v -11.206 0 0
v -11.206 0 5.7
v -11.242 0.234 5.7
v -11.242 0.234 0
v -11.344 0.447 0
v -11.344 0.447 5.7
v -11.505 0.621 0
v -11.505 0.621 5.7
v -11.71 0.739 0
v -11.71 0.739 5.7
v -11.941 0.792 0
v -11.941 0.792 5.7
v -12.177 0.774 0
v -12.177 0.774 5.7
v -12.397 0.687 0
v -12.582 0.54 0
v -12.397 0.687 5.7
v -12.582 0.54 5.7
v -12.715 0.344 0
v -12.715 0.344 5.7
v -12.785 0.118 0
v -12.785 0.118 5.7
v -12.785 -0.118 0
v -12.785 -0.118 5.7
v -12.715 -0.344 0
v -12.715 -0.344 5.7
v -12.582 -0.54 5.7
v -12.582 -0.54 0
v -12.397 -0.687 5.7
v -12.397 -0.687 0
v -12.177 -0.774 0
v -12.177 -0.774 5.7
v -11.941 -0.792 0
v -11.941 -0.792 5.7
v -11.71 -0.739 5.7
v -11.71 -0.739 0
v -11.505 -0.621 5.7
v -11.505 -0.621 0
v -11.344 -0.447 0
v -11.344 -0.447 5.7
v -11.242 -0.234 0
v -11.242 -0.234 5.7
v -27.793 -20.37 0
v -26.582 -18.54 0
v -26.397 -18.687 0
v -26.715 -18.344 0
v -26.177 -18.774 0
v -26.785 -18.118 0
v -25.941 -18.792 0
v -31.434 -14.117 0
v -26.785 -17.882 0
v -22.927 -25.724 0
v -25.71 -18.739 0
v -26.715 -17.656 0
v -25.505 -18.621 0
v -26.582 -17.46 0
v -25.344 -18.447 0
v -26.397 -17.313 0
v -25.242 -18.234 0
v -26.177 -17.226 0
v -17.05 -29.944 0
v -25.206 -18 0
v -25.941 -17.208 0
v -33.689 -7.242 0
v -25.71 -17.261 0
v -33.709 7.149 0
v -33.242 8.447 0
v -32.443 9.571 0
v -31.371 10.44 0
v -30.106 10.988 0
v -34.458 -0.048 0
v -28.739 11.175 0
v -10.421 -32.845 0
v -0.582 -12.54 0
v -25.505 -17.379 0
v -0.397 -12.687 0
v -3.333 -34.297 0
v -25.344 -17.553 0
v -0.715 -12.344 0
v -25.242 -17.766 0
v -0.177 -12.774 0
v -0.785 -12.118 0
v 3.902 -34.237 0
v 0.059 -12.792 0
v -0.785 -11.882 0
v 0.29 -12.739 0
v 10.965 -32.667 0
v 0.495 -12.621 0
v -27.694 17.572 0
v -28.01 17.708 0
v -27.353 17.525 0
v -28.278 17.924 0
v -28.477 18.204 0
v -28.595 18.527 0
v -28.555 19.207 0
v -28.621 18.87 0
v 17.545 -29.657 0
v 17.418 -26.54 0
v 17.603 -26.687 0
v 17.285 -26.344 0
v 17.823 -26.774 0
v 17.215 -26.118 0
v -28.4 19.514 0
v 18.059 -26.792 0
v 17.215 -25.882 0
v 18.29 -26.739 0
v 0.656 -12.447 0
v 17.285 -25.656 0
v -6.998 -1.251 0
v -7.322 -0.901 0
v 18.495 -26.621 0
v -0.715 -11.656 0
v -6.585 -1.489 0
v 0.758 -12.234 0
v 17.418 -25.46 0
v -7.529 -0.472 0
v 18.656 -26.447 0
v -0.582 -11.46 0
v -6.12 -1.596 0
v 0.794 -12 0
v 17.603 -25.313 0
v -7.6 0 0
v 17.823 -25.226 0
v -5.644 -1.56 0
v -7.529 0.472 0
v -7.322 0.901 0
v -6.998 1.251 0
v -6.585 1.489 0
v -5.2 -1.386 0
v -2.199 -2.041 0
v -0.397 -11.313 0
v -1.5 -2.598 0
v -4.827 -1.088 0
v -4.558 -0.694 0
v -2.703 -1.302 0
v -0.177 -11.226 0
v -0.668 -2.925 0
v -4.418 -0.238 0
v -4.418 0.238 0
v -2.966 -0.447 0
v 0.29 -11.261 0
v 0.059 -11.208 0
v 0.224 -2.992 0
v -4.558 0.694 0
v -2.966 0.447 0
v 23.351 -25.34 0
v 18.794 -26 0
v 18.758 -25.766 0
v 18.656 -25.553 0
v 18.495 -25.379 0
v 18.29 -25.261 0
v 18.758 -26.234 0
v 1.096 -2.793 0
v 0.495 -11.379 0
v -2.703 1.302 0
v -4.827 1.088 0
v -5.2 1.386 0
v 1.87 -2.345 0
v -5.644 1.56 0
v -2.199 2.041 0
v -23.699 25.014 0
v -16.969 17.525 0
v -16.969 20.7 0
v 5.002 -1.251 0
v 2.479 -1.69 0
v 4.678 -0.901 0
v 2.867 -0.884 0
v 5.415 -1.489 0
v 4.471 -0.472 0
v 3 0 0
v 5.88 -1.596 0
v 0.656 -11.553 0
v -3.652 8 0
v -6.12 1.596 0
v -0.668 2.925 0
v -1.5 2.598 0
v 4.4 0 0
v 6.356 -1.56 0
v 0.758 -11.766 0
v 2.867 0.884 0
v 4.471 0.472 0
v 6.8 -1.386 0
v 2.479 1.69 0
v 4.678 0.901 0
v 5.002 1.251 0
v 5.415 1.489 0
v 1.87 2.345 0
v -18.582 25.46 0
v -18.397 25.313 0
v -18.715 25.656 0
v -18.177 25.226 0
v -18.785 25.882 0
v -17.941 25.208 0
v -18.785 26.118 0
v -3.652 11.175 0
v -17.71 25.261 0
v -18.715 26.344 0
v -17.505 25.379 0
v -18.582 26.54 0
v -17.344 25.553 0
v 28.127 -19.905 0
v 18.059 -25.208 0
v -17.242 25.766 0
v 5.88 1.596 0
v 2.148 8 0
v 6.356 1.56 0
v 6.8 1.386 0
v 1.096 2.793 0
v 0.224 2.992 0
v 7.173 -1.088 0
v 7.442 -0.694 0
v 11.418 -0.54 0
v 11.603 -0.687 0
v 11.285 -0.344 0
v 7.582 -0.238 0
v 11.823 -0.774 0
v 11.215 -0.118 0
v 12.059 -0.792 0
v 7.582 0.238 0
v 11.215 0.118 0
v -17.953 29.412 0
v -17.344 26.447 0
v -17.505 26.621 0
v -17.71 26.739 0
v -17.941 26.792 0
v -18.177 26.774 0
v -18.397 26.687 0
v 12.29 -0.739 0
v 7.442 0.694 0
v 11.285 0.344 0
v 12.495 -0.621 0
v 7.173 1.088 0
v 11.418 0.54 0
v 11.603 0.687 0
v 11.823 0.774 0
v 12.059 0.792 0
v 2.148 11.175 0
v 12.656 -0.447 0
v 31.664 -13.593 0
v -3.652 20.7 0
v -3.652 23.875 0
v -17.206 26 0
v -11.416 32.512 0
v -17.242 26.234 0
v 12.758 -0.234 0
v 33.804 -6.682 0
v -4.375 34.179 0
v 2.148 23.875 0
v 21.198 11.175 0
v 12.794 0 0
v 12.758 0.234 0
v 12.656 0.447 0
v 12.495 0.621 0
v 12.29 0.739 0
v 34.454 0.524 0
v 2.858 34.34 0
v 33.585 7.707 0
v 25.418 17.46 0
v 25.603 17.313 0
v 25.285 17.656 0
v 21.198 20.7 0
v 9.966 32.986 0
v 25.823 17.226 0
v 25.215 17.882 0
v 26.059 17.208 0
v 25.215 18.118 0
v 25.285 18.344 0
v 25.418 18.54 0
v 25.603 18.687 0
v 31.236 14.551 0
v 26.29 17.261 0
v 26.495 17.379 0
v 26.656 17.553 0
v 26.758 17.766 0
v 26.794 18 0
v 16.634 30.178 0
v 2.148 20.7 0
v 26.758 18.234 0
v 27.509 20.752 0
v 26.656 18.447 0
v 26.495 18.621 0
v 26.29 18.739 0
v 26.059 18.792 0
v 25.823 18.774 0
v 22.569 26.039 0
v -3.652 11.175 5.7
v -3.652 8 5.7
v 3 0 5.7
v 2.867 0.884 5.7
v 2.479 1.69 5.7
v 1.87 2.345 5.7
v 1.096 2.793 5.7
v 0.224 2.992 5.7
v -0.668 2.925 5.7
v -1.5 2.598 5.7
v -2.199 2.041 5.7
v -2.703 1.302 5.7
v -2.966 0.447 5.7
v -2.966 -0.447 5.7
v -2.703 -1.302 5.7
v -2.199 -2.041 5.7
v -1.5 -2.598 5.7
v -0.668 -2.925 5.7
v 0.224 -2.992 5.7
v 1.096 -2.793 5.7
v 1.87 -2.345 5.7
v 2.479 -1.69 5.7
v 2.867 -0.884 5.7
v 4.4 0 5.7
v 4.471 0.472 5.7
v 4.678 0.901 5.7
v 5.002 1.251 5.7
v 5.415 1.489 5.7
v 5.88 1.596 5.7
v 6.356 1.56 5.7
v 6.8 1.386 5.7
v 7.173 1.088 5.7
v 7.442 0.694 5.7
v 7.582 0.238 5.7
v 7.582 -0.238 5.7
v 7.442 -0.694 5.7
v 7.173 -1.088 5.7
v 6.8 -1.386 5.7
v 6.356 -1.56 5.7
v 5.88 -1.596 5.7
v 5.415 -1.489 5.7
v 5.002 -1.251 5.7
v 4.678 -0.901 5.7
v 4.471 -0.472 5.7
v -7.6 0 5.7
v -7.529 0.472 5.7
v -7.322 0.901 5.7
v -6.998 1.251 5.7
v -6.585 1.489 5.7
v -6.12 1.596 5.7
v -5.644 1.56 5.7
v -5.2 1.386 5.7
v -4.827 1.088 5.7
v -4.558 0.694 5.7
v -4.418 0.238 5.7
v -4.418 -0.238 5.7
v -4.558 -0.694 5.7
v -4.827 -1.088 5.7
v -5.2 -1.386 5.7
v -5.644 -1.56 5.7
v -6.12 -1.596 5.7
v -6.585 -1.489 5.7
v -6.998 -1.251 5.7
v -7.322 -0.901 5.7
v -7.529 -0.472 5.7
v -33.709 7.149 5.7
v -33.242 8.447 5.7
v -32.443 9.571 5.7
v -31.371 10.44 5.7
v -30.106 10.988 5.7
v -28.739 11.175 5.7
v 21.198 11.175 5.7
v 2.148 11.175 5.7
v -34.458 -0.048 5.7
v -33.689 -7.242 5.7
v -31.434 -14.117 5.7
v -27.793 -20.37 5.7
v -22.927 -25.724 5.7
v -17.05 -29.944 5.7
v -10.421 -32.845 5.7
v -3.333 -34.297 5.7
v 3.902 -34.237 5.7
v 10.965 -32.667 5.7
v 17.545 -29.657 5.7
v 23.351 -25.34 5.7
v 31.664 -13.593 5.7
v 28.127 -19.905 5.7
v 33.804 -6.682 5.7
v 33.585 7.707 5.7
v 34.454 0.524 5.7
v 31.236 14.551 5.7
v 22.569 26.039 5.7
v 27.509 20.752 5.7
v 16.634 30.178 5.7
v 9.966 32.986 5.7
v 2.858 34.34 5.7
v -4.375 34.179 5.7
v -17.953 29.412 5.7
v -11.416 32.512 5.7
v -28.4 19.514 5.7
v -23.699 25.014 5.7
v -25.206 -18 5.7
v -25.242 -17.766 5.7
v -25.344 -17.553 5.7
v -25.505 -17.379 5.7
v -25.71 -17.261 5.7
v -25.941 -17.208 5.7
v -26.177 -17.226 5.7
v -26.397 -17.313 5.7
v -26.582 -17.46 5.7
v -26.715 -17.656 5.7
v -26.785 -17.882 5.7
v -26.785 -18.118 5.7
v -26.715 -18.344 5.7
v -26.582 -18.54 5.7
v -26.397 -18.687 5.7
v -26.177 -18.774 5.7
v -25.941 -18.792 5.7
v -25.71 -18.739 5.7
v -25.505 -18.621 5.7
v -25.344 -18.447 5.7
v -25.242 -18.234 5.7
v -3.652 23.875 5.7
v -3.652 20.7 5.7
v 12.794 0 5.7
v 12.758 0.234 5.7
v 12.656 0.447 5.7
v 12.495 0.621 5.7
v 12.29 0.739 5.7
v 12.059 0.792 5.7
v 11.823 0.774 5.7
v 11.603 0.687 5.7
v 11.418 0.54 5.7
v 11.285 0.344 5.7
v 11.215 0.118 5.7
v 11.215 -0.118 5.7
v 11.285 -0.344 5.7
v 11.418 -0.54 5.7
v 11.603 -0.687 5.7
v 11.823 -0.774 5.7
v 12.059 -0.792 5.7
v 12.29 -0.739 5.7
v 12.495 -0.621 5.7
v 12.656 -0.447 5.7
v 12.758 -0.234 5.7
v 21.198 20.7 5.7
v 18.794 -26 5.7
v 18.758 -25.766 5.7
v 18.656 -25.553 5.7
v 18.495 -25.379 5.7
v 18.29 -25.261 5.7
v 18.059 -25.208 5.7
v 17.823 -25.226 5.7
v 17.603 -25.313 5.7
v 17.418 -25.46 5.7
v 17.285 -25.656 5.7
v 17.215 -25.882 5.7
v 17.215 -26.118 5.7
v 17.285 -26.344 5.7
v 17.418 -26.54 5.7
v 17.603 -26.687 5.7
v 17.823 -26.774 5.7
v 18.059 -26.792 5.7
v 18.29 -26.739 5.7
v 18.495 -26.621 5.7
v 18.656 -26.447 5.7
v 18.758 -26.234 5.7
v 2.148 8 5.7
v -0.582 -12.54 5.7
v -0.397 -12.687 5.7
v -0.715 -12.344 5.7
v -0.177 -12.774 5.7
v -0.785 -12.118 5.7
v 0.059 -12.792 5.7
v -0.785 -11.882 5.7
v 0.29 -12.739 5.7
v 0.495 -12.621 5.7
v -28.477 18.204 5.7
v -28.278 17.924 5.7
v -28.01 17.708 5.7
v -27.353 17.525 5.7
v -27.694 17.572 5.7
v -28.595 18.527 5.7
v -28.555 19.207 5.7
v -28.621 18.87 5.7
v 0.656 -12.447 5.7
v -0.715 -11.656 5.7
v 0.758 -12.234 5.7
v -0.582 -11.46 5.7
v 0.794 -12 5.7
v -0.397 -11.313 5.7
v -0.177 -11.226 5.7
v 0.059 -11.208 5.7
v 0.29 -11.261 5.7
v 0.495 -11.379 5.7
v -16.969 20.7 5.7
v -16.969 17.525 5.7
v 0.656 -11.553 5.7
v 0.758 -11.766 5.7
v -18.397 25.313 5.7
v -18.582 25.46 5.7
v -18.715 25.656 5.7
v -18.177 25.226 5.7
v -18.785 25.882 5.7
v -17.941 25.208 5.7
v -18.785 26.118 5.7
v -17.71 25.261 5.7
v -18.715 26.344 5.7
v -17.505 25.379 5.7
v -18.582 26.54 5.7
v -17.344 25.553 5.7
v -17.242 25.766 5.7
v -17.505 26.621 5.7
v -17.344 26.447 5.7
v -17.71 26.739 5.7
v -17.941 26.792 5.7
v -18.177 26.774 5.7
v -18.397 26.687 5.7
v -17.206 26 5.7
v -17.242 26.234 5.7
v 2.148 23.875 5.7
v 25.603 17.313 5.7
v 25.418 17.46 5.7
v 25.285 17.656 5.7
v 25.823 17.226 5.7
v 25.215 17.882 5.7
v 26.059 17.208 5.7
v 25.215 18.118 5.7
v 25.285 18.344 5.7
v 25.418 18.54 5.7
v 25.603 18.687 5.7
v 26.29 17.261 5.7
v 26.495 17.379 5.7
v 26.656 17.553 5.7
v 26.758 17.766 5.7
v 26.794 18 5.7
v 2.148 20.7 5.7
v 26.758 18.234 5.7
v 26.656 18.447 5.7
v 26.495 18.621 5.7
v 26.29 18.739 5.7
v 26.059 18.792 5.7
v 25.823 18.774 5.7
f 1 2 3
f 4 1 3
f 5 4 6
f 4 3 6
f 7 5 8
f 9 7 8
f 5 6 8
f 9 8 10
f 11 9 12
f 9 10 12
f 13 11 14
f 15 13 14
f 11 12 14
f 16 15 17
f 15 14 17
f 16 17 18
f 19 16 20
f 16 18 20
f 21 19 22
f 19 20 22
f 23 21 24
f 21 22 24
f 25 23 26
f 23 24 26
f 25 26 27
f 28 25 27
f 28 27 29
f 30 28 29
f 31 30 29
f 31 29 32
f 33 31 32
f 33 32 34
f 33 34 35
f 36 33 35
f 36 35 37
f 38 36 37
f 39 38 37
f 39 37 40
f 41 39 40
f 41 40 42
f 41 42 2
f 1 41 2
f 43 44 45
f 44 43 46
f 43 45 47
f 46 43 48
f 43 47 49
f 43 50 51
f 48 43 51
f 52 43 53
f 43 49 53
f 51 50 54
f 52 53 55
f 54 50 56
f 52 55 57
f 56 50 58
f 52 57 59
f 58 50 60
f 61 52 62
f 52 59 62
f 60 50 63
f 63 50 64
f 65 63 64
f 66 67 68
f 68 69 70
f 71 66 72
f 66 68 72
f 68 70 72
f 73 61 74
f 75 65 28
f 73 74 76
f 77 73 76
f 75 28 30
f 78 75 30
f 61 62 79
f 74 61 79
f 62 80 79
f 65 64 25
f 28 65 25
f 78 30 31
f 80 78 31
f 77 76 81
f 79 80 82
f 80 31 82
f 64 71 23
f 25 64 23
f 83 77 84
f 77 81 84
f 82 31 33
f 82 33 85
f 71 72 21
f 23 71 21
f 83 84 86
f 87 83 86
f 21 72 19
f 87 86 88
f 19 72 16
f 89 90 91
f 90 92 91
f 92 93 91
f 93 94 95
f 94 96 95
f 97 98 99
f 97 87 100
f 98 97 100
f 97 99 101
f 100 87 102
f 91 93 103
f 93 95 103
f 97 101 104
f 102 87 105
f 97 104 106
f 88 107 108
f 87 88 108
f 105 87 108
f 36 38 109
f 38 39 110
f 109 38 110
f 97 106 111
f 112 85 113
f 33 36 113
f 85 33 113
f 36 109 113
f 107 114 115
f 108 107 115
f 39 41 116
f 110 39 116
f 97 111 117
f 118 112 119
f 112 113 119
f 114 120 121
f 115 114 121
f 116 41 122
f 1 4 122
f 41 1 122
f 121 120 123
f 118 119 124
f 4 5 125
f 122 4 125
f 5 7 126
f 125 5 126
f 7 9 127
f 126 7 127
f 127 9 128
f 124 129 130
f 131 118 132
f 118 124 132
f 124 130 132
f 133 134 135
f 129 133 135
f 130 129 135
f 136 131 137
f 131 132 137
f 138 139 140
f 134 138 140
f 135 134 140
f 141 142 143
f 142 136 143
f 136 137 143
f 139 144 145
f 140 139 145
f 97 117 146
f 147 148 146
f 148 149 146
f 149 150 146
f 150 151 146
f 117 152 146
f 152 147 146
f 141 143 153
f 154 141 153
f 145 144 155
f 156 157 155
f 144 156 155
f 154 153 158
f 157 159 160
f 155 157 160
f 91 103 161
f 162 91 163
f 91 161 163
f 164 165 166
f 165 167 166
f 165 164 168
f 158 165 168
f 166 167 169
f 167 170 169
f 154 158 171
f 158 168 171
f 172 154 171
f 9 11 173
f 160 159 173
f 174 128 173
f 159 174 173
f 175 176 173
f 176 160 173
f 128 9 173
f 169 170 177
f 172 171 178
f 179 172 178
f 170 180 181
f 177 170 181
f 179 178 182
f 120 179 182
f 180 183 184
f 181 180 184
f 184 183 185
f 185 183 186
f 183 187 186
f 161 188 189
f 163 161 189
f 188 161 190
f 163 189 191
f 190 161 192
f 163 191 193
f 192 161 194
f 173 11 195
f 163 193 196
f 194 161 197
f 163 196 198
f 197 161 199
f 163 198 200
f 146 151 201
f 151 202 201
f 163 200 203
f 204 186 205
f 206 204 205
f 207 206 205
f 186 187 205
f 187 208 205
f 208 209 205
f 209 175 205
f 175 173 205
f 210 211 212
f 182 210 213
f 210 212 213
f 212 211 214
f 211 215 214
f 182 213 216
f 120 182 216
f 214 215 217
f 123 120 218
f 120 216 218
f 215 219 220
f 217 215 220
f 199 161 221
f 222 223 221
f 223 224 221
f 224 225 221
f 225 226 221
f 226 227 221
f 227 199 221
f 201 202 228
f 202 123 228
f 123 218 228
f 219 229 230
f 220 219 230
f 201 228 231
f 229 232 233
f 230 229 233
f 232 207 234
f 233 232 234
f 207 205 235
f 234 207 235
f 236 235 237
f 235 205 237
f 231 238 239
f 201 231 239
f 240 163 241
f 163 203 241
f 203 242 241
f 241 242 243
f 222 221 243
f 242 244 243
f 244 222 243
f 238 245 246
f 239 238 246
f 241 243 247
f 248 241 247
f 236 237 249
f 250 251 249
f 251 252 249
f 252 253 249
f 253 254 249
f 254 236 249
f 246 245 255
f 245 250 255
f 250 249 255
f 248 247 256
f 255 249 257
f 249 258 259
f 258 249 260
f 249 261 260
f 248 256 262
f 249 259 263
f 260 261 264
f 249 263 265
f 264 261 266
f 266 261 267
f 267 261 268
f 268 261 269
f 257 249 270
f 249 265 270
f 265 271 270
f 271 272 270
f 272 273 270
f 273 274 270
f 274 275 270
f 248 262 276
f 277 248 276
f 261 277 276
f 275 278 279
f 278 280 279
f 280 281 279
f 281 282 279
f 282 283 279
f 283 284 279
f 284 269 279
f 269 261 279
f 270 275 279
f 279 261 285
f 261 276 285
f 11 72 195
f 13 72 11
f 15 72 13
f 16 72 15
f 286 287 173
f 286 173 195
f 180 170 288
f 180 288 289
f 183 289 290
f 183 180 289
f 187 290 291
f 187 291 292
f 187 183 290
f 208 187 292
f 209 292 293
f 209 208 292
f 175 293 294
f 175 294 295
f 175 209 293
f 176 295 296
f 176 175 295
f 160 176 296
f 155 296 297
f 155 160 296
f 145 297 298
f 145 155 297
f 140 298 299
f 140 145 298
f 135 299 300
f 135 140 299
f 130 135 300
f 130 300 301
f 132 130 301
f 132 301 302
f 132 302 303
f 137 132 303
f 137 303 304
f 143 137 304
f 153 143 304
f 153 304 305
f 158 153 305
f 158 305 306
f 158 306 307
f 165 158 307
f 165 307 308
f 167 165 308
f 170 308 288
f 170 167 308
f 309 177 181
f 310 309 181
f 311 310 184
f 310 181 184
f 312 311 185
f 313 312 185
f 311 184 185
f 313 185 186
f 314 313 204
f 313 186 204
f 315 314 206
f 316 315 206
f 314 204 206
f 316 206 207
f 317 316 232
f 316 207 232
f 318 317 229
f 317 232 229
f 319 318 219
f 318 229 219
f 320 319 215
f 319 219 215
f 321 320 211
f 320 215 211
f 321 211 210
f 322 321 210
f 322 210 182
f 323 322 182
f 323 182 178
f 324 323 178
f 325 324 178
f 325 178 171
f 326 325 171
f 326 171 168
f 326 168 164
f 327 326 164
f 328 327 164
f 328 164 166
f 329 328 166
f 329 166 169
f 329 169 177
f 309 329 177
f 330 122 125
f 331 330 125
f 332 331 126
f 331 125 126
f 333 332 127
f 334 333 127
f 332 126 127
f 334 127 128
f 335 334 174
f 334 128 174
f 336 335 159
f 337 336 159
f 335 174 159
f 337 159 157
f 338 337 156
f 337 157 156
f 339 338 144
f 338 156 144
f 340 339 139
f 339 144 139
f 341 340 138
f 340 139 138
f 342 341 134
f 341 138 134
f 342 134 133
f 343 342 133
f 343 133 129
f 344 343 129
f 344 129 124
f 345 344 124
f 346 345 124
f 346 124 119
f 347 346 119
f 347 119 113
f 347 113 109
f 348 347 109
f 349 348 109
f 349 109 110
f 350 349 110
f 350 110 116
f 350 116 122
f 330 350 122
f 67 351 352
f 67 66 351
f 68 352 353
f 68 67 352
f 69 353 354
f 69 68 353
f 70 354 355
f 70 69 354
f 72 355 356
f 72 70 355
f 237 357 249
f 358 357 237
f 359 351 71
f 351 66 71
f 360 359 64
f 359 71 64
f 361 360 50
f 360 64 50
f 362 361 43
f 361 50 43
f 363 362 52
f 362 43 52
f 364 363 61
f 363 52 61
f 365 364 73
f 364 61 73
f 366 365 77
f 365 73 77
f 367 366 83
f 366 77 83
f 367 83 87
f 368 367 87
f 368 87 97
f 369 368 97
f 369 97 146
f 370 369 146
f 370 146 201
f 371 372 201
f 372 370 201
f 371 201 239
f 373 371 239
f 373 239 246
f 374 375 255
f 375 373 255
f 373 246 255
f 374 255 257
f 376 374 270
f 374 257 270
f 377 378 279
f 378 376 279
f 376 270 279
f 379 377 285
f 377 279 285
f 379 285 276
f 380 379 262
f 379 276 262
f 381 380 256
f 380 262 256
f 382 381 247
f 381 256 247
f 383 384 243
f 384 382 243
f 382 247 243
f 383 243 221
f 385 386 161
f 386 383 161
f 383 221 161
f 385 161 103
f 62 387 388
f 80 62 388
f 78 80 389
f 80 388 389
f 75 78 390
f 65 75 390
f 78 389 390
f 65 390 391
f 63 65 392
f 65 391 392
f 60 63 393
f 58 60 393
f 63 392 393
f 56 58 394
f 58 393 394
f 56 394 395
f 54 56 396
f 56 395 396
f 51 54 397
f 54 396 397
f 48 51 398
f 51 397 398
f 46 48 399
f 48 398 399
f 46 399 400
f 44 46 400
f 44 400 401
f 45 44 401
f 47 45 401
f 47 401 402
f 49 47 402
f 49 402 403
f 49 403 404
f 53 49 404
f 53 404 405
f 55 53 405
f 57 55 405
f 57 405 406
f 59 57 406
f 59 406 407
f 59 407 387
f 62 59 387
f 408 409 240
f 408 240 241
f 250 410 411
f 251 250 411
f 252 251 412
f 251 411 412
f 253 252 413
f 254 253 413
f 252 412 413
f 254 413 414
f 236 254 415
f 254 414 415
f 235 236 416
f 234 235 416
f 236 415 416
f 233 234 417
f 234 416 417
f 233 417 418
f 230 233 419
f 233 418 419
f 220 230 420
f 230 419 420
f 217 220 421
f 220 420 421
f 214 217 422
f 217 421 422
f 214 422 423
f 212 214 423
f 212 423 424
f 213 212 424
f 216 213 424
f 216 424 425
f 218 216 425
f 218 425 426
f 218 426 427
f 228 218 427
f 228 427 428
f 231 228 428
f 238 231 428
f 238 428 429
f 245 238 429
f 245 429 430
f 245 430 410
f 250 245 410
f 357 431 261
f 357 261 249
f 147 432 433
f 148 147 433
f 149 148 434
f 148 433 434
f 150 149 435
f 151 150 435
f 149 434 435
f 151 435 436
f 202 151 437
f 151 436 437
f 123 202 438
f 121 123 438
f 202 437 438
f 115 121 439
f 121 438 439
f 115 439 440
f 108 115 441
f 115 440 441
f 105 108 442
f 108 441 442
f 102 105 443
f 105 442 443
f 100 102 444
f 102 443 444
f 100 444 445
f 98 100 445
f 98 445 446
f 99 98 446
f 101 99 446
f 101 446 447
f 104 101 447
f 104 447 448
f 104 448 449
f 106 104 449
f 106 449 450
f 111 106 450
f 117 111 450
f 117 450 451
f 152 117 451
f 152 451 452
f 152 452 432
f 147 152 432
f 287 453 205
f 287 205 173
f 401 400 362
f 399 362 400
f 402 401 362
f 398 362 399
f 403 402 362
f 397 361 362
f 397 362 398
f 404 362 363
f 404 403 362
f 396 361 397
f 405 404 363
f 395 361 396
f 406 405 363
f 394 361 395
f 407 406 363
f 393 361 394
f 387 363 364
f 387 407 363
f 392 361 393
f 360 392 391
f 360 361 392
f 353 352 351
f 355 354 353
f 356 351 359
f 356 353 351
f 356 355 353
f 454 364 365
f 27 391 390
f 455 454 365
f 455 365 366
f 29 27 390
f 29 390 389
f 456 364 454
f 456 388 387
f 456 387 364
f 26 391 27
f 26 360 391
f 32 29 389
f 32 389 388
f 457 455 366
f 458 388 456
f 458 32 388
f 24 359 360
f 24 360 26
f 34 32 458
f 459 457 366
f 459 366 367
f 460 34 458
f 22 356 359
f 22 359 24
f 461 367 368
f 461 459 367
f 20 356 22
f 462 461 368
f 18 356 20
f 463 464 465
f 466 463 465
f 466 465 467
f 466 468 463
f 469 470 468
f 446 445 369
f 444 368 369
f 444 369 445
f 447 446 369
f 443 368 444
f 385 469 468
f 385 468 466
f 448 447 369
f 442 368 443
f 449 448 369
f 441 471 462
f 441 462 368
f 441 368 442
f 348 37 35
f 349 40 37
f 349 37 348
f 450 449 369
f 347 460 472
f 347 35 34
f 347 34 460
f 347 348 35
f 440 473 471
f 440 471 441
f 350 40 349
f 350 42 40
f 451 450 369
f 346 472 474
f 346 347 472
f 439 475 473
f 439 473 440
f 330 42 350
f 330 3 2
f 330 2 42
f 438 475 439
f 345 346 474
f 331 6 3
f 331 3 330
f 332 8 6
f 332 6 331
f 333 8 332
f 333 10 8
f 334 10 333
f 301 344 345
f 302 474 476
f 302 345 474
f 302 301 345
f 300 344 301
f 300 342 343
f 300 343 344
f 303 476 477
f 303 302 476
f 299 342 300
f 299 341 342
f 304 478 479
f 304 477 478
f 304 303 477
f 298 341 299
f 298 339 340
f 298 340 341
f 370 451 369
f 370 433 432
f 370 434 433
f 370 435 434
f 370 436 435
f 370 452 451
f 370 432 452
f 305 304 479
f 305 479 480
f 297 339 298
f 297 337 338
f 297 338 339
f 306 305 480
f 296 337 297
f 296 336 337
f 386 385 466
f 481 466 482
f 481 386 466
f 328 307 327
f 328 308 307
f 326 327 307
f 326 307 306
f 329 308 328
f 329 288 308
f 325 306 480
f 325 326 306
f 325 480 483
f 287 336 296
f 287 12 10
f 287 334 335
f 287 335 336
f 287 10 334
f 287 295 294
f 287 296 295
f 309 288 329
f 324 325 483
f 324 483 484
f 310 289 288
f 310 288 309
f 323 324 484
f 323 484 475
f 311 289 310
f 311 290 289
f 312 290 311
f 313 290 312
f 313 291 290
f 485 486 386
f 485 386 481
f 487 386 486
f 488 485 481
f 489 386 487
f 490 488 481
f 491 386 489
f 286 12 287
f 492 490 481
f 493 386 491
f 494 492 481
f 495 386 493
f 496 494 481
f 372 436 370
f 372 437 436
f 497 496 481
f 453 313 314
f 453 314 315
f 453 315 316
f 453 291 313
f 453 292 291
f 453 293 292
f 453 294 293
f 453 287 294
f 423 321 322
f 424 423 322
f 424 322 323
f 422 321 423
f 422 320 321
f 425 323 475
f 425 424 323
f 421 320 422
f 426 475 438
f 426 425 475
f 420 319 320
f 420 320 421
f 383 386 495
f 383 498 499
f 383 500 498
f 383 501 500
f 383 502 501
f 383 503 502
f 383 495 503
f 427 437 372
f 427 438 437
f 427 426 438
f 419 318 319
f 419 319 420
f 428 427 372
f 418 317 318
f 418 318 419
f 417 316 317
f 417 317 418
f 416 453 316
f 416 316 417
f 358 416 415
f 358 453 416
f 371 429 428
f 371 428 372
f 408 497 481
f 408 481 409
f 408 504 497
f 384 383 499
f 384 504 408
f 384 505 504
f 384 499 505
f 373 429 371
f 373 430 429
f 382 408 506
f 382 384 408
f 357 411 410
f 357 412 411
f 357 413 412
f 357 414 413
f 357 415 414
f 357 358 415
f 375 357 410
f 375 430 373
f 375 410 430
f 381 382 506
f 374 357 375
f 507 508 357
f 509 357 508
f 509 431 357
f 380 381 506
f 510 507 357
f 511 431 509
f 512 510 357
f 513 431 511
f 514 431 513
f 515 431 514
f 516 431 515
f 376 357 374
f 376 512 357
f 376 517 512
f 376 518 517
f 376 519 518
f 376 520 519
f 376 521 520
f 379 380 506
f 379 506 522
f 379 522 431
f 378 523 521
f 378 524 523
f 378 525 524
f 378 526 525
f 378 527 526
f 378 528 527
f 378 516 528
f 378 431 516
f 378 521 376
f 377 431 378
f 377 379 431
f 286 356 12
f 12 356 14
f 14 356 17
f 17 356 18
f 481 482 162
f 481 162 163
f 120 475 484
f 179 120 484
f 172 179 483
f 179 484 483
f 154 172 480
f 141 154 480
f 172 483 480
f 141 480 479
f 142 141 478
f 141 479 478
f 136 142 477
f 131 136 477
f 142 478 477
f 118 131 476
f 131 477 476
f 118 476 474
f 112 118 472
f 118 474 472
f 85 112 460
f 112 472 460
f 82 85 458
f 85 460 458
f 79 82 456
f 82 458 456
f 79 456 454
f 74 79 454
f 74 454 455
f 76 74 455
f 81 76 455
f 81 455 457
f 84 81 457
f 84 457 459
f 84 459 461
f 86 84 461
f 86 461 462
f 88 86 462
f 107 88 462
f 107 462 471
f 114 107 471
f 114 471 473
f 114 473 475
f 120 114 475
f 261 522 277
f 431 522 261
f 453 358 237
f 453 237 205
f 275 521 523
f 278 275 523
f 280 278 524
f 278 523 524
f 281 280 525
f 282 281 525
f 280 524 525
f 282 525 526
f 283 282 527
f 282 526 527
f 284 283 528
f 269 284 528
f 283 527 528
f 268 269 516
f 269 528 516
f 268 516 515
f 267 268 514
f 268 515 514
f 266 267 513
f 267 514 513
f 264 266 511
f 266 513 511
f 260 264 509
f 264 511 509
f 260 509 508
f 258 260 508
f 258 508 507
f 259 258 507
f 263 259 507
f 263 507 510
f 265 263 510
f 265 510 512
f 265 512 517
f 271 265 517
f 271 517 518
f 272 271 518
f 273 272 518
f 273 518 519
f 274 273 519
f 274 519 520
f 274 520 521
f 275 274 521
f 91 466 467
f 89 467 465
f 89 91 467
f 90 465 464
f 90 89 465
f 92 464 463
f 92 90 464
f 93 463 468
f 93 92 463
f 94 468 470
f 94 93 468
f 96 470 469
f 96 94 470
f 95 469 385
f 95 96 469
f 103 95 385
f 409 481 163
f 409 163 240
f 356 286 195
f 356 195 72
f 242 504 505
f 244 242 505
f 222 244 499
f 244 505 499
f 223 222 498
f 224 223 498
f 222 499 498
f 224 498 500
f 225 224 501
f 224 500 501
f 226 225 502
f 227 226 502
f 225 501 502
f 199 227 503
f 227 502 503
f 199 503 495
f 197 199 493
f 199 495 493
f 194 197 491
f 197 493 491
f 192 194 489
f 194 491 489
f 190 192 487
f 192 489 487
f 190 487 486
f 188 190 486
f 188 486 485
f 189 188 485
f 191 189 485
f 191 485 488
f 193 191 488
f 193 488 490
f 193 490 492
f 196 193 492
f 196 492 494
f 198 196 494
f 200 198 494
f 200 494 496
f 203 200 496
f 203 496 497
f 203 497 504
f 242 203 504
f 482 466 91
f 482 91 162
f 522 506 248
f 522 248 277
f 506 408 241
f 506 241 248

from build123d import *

# Parameters (mm, degrees)
SKETCH1_R                = 34.458333333
SKETCH1_R_2              = 3
BOSS_EXTRUDE1_DEPTH      = 5.7
CUT_EXTRUDE2_DEPTH       = 50.063667537
FILLET1_R                = 5.08
FILLET2_R                = 1.27
SKETCH2_R                = 0.79375
CUT_EXTRUDE1_DEPTH       = 50.063667537
M3_CLEARANCE_HOLE2_D     = 3.2
M3_CLEARANCE_HOLE2_DEPTH = 12.7
M3_CLEARANCE_HOLE2_TIP   = 0.96137699


with BuildPart() as part:
    # Sketch1 → Boss-Extrude1 (new body)
    with BuildSketch(Plane.XY):
        Circle(SKETCH1_R)
        Circle(SKETCH1_R_2, mode=Mode.SUBTRACT)
    extrude(amount=BOSS_EXTRUDE1_DEPTH)

    # Sketch3 → Cut-Extrude2 (cut, through all)
    with BuildSketch(Plane.XY.offset(5.7)):
        with BuildLine():
            Line((-3.652101058, 11.175), (-32.595952373, 11.175))
            ThreePointArc((-32.595952373, 11.175), (-31.293969256, 14.424431508), (-29.669026123, 17.525))
            Line((-29.669026123, 17.525), (-16.969026123, 17.525))
            Line((-16.969026123, 17.525), (-16.969026123, 20.7))
            Line((-16.969026123, 20.7), (-3.652101058, 20.7))
            Line((-3.652101058, 20.7), (-3.652101058, 23.875))
            Line((-3.652101058, 23.875), (2.147898942, 23.875))
            Line((2.147898942, 23.875), (2.147898942, 20.7))
            Line((2.147898942, 20.7), (21.197898942, 20.7))
            Line((21.197898942, 20.7), (21.197898942, 11.175))
            Line((21.197898942, 11.175), (2.147898942, 11.175))
            Line((2.147898942, 11.175), (2.147898942, 8))
            Line((2.147898942, 8), (-3.652101058, 8))
            Line((-3.652101058, 8), (-3.652101058, 11.175))
        make_face()
    extrude(amount=-CUT_EXTRUDE2_DEPTH, mode=Mode.SUBTRACT)

    # Fillet1
    fillet1_edges = [part.edges().sort_by_distance(p)[0] for p in [
        (-32.595952373, 11.175, 2.85),
    ]]
    fillet(fillet1_edges, radius=FILLET1_R)

    # Fillet2
    fillet2_edges = [part.edges().sort_by_distance(p)[0] for p in [
        (-29.669026123, 17.525, 2.85),
    ]]
    fillet(fillet2_edges, radius=FILLET2_R)

    # Sketch2 → Cut-Extrude1 (cut, through all)
    with BuildSketch(Plane.XY.offset(5.7)):
        with Locations((0, 12)):
            Circle(SKETCH2_R)
        with Locations((12, 0)):
            Circle(SKETCH2_R)
        with Locations((0, -12)):
            Circle(SKETCH2_R)
        with Locations((-12, 0)):
            Circle(SKETCH2_R)
        with Locations((-18, 26)):
            Circle(SKETCH2_R)
        with Locations((26, 18)):
            Circle(SKETCH2_R)
        with Locations((18, -26)):
            Circle(SKETCH2_R)
        with Locations((-26, -18)):
            Circle(SKETCH2_R)
    extrude(amount=-CUT_EXTRUDE1_DEPTH, mode=Mode.SUBTRACT)

    # M3 Clearance Hole2
    with Locations(Plane.XY.offset(5.7)):
        with Locations((-6, 0), (6, 0)):
            Hole(M3_CLEARANCE_HOLE2_D / 2, depth=M3_CLEARANCE_HOLE2_DEPTH)
            with Locations((0, 0, -(M3_CLEARANCE_HOLE2_DEPTH + M3_CLEARANCE_HOLE2_TIP / 2))):  # 118° drill point
                Cone(0, M3_CLEARANCE_HOLE2_D / 2, M3_CLEARANCE_HOLE2_TIP, mode=Mode.SUBTRACT)


solid = part.part
